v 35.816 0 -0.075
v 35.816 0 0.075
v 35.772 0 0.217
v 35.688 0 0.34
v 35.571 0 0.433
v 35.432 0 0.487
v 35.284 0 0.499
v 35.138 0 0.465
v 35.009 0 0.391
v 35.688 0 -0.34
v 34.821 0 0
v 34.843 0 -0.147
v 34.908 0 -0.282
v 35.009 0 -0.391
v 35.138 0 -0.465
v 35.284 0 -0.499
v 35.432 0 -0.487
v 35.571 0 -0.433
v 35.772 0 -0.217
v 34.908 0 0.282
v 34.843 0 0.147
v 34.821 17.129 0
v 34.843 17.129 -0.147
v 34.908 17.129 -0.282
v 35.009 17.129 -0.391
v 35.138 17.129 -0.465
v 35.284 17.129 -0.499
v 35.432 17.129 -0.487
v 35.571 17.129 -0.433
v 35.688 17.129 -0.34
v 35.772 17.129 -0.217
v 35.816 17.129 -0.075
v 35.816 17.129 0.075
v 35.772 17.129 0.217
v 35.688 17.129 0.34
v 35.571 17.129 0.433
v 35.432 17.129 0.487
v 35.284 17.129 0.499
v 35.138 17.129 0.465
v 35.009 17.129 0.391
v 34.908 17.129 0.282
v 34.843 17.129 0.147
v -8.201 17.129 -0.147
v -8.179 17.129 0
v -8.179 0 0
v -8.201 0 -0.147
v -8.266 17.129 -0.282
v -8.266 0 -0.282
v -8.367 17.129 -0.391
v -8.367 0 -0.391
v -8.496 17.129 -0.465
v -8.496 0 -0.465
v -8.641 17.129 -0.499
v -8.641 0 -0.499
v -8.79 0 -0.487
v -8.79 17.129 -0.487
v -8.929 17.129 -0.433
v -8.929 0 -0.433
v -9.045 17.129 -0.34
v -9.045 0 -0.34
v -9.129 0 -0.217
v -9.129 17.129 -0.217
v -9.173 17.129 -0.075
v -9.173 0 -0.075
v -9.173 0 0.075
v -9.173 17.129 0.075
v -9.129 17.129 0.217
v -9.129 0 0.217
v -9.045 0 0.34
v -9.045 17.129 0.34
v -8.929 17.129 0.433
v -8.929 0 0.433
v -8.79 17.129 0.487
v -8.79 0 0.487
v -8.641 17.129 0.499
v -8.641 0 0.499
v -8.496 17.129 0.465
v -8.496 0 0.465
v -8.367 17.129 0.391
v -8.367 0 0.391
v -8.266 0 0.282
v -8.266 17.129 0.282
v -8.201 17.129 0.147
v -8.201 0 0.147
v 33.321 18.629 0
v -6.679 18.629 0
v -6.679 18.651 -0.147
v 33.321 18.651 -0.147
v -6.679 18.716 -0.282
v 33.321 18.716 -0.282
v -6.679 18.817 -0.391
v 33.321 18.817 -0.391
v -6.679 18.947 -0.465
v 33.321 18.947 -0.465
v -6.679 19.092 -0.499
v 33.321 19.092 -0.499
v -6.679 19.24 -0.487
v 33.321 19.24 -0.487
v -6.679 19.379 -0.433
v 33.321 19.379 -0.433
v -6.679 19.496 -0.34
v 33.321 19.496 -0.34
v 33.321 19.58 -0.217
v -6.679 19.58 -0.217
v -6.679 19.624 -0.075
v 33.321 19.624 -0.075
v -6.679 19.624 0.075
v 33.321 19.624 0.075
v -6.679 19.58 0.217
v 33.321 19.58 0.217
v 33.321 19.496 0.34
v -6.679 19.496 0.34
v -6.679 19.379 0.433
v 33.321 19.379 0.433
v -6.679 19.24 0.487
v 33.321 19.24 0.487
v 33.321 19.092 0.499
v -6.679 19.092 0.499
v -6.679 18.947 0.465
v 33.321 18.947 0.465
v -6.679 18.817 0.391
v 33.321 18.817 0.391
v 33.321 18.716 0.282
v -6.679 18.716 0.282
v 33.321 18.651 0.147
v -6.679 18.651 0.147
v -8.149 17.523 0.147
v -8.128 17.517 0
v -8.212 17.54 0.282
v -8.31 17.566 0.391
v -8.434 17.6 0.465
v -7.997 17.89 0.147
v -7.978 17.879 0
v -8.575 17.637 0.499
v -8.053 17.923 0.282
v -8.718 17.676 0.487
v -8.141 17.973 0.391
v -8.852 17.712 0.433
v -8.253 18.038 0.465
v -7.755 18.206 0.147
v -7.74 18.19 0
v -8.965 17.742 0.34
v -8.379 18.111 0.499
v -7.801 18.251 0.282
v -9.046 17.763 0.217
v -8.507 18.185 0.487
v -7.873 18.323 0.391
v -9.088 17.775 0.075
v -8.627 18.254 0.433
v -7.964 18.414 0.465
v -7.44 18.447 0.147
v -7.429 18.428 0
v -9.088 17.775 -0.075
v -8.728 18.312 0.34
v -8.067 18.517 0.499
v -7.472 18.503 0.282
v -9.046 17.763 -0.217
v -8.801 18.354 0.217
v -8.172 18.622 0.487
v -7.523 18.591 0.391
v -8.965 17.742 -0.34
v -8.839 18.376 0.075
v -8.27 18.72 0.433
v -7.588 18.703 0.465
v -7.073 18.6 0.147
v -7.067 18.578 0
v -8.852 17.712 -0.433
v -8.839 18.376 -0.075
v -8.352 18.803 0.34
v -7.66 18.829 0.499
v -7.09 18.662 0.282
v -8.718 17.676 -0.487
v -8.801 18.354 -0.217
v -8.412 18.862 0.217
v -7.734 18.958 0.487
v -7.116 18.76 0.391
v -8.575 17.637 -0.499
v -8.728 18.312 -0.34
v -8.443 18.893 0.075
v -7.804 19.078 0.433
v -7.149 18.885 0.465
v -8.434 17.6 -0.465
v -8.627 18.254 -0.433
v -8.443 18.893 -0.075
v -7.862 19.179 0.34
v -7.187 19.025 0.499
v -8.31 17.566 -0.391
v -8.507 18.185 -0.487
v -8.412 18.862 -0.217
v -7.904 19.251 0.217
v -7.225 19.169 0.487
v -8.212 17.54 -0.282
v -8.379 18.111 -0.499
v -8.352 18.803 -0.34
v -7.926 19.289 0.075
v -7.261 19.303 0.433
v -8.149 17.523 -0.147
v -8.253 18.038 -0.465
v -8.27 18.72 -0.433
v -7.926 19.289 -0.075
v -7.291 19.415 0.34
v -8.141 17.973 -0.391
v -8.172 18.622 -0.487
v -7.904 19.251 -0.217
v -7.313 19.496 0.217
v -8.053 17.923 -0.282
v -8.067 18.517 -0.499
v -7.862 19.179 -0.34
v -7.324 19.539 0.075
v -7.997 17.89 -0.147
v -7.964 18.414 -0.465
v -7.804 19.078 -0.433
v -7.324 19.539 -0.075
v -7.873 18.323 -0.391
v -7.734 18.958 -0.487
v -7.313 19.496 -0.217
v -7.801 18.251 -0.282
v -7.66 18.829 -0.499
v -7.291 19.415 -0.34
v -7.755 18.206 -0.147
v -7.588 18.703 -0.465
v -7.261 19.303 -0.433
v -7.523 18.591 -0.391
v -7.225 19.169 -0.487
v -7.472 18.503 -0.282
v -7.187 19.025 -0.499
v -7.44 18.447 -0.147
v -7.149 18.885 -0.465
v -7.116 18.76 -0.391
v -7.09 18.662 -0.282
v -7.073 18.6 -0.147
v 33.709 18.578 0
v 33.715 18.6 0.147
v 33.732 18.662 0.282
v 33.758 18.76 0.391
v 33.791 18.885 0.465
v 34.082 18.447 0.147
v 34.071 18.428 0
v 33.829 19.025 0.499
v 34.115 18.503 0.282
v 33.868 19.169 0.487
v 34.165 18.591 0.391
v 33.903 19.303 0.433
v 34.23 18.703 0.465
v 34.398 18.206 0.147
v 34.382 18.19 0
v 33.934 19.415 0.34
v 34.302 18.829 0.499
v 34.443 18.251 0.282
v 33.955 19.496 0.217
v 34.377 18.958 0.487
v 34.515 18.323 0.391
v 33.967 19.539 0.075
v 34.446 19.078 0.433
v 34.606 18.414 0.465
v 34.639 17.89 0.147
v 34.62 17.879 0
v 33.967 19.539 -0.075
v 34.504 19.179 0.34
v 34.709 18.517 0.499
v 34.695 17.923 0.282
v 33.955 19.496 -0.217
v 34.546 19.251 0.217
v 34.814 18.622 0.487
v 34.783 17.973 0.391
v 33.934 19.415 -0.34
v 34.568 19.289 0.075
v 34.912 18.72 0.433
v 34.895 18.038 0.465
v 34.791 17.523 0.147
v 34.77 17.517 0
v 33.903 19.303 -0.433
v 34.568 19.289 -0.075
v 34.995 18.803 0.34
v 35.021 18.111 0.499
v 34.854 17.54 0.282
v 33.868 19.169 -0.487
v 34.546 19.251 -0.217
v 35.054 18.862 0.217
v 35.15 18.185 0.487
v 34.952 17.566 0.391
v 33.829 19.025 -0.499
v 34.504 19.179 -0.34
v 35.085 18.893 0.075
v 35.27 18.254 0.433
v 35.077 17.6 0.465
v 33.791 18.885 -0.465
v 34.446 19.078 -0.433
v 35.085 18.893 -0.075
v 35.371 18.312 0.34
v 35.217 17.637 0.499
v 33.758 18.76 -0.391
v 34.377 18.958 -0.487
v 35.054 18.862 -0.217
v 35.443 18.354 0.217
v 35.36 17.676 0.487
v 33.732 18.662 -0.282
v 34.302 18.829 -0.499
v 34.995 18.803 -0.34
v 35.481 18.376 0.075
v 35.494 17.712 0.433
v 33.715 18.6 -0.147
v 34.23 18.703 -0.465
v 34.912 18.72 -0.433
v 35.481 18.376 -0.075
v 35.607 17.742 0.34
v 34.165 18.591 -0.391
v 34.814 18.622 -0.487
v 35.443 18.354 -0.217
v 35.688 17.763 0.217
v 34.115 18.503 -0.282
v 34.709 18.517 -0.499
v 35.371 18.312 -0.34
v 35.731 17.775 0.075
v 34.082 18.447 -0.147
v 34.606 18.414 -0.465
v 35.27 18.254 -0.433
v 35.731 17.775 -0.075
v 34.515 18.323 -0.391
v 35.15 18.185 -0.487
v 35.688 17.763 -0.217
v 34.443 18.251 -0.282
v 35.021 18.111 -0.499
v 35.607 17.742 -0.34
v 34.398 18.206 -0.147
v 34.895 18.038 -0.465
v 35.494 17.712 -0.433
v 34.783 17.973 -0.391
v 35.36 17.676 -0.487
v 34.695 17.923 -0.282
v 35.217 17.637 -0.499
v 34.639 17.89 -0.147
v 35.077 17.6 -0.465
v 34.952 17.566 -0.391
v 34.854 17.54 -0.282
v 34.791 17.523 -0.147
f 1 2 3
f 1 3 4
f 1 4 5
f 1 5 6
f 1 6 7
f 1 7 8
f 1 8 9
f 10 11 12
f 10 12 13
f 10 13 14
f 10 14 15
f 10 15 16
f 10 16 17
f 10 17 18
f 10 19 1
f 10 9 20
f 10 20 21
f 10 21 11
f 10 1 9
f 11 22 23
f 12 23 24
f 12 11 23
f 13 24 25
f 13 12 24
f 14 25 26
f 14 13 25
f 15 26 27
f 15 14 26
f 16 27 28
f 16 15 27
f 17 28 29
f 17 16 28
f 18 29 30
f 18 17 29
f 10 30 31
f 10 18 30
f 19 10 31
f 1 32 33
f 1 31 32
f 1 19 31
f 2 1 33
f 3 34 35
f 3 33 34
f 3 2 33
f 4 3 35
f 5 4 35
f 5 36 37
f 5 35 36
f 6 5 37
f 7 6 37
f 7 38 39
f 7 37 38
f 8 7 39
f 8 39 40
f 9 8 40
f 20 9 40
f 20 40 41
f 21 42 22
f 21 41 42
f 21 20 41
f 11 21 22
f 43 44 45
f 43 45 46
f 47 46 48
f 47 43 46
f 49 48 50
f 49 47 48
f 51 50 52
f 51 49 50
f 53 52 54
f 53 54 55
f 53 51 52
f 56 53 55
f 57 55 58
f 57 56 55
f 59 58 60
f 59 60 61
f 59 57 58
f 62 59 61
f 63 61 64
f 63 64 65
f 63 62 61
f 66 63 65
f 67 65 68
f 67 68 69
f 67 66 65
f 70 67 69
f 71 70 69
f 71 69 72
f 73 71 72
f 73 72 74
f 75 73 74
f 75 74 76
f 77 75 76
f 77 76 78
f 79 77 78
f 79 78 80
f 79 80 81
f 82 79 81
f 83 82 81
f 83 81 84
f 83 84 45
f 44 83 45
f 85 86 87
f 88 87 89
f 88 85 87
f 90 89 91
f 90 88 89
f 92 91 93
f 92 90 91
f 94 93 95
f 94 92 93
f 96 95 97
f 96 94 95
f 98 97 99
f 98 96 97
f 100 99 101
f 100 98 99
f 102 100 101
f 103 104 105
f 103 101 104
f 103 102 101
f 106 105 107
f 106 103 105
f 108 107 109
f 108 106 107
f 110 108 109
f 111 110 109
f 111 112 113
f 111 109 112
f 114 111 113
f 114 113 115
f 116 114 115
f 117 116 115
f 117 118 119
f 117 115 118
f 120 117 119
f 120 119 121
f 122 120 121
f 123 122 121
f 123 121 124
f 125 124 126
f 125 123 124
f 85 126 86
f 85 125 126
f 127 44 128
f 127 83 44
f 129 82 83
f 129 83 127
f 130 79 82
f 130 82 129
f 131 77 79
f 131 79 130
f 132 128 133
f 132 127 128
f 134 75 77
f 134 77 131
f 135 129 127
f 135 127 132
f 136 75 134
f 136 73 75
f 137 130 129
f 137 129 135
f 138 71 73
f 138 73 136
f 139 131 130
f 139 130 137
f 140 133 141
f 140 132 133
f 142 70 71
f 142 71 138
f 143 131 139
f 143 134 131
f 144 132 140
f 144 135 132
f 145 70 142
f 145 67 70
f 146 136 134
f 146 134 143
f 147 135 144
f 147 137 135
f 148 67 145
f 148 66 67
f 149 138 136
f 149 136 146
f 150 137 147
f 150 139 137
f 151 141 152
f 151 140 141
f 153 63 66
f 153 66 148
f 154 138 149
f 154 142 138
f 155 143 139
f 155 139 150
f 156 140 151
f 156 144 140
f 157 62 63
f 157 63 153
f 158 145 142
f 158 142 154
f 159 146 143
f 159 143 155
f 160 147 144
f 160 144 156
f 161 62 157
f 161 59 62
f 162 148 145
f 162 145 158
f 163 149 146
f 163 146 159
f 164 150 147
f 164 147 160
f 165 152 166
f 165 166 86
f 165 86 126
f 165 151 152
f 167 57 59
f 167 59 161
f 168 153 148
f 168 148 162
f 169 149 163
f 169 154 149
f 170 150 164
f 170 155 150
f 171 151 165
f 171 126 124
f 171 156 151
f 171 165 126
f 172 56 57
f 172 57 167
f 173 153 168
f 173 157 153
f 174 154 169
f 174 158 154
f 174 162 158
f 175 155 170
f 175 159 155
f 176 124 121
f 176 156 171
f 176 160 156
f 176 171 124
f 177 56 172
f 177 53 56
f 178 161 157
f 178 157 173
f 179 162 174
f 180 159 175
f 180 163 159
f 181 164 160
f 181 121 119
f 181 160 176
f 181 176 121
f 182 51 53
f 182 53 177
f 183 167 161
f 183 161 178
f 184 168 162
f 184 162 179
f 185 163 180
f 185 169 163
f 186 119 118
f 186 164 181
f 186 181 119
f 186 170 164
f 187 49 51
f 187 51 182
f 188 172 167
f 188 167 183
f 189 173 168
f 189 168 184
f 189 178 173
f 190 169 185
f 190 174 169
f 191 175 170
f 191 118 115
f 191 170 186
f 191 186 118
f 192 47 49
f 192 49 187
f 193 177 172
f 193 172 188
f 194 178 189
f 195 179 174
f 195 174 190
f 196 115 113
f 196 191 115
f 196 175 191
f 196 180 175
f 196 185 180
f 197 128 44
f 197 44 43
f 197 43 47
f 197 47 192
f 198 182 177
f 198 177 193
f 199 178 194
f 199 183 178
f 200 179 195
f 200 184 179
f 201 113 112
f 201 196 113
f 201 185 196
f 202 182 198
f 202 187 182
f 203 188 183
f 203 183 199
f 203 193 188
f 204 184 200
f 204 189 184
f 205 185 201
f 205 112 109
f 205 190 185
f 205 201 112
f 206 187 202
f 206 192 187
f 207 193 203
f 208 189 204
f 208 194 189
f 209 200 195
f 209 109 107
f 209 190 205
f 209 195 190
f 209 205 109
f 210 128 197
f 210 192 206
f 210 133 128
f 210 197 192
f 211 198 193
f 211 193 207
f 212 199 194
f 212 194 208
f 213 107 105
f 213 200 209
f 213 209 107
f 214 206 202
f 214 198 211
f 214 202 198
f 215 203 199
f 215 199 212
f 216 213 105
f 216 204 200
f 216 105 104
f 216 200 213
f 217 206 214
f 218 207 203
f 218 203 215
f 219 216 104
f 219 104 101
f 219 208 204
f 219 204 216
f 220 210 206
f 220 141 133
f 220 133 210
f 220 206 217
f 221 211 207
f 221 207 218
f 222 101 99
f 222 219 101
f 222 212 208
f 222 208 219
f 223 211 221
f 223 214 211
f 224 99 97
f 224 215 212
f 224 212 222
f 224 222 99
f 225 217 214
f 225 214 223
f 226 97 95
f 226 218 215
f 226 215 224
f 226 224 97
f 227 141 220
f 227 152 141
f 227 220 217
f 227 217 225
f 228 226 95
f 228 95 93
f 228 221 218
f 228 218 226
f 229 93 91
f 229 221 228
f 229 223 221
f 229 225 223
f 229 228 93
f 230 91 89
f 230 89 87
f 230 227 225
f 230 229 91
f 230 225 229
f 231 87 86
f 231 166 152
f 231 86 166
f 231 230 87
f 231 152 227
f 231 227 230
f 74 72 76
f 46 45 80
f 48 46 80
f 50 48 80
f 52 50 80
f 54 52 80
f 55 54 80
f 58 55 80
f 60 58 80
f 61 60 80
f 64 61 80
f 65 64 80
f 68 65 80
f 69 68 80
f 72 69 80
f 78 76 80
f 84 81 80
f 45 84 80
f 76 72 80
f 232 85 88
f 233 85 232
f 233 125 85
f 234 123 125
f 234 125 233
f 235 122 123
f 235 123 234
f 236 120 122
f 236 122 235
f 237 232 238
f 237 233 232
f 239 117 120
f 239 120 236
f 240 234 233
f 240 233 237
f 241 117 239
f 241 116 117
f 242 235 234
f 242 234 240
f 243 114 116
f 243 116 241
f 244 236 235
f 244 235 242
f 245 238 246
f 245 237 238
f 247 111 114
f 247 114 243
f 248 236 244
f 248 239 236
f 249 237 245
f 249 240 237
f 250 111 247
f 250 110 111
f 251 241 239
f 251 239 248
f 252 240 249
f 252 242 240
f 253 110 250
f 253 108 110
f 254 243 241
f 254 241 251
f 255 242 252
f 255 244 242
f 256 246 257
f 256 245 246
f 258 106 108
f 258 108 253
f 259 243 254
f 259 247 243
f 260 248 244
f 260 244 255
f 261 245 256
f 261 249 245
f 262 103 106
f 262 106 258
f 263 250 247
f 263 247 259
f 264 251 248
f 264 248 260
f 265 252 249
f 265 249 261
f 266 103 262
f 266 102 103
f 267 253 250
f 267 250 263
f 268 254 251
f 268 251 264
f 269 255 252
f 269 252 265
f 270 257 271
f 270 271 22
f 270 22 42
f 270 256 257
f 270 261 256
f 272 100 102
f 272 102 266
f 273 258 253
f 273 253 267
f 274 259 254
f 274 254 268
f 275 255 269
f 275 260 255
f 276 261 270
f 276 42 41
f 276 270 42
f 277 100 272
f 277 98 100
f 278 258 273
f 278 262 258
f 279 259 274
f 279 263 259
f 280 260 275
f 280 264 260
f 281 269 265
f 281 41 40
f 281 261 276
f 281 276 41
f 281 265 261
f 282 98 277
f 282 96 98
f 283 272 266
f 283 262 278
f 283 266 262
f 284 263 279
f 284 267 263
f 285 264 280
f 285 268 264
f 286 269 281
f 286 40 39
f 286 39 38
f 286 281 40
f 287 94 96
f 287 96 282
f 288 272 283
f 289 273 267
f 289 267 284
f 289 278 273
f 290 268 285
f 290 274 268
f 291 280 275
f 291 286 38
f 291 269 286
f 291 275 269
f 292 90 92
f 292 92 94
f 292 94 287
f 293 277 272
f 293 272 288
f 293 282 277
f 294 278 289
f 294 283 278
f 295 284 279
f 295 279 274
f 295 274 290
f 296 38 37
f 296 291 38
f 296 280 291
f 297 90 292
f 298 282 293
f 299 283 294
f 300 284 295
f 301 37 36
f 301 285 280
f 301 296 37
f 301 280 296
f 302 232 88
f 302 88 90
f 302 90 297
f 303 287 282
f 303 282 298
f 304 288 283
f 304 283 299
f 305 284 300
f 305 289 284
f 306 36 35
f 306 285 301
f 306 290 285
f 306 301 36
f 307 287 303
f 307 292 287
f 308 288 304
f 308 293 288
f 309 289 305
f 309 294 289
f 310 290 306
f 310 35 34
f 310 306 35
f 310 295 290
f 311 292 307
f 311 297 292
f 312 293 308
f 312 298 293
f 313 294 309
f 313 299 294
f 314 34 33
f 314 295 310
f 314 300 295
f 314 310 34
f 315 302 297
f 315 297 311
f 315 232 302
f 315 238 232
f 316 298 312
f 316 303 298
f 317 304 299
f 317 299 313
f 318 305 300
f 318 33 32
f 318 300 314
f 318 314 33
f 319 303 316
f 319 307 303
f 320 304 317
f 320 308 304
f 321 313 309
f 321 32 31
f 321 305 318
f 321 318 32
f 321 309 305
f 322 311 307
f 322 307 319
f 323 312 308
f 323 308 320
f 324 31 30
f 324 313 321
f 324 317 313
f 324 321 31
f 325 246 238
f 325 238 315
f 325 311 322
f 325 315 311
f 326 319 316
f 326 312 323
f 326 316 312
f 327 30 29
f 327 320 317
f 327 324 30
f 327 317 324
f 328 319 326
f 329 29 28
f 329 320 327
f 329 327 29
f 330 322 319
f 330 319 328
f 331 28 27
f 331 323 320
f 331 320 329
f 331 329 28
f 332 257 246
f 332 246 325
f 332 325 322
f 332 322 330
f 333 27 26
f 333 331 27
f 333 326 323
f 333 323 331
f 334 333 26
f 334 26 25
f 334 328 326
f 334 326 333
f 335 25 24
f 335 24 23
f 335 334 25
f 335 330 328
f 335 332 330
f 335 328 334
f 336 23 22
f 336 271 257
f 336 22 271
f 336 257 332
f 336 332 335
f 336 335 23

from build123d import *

# Parameters (mm, degrees)
ESQUISSE2_R = 0.5


with BuildPart() as part:
    # Balayage1: sweep along a path in Esquisse1
    with BuildLine(Plane.XY) as balayage1_path:
        Line((-8.67886357, 0), (-8.67886357, 17.12919258))
        ThreePointArc((-8.67886357, 17.12919258), (-8.093077132, 18.543406142), (-6.67886357, 19.12919258))
        Line((-6.67886357, 19.12919258), (33.32113643, 19.12919258))
        ThreePointArc((33.32113643, 19.12919258), (34.735349992, 18.543406142), (35.32113643, 17.12919258))
        Line((35.32113643, 17.12919258), (35.32113643, 0))
    # Esquisse2 → Balayage1 (sweep)
    with BuildSketch(Plane(origin=(0, 0, 0), x_dir=(1, 0, 0), z_dir=(0, 1, 0))):
        with Locations((-8.67886357, 0)):
            Circle(ESQUISSE2_R)
    sweep(path=balayage1_path.line)


solid = part.part
